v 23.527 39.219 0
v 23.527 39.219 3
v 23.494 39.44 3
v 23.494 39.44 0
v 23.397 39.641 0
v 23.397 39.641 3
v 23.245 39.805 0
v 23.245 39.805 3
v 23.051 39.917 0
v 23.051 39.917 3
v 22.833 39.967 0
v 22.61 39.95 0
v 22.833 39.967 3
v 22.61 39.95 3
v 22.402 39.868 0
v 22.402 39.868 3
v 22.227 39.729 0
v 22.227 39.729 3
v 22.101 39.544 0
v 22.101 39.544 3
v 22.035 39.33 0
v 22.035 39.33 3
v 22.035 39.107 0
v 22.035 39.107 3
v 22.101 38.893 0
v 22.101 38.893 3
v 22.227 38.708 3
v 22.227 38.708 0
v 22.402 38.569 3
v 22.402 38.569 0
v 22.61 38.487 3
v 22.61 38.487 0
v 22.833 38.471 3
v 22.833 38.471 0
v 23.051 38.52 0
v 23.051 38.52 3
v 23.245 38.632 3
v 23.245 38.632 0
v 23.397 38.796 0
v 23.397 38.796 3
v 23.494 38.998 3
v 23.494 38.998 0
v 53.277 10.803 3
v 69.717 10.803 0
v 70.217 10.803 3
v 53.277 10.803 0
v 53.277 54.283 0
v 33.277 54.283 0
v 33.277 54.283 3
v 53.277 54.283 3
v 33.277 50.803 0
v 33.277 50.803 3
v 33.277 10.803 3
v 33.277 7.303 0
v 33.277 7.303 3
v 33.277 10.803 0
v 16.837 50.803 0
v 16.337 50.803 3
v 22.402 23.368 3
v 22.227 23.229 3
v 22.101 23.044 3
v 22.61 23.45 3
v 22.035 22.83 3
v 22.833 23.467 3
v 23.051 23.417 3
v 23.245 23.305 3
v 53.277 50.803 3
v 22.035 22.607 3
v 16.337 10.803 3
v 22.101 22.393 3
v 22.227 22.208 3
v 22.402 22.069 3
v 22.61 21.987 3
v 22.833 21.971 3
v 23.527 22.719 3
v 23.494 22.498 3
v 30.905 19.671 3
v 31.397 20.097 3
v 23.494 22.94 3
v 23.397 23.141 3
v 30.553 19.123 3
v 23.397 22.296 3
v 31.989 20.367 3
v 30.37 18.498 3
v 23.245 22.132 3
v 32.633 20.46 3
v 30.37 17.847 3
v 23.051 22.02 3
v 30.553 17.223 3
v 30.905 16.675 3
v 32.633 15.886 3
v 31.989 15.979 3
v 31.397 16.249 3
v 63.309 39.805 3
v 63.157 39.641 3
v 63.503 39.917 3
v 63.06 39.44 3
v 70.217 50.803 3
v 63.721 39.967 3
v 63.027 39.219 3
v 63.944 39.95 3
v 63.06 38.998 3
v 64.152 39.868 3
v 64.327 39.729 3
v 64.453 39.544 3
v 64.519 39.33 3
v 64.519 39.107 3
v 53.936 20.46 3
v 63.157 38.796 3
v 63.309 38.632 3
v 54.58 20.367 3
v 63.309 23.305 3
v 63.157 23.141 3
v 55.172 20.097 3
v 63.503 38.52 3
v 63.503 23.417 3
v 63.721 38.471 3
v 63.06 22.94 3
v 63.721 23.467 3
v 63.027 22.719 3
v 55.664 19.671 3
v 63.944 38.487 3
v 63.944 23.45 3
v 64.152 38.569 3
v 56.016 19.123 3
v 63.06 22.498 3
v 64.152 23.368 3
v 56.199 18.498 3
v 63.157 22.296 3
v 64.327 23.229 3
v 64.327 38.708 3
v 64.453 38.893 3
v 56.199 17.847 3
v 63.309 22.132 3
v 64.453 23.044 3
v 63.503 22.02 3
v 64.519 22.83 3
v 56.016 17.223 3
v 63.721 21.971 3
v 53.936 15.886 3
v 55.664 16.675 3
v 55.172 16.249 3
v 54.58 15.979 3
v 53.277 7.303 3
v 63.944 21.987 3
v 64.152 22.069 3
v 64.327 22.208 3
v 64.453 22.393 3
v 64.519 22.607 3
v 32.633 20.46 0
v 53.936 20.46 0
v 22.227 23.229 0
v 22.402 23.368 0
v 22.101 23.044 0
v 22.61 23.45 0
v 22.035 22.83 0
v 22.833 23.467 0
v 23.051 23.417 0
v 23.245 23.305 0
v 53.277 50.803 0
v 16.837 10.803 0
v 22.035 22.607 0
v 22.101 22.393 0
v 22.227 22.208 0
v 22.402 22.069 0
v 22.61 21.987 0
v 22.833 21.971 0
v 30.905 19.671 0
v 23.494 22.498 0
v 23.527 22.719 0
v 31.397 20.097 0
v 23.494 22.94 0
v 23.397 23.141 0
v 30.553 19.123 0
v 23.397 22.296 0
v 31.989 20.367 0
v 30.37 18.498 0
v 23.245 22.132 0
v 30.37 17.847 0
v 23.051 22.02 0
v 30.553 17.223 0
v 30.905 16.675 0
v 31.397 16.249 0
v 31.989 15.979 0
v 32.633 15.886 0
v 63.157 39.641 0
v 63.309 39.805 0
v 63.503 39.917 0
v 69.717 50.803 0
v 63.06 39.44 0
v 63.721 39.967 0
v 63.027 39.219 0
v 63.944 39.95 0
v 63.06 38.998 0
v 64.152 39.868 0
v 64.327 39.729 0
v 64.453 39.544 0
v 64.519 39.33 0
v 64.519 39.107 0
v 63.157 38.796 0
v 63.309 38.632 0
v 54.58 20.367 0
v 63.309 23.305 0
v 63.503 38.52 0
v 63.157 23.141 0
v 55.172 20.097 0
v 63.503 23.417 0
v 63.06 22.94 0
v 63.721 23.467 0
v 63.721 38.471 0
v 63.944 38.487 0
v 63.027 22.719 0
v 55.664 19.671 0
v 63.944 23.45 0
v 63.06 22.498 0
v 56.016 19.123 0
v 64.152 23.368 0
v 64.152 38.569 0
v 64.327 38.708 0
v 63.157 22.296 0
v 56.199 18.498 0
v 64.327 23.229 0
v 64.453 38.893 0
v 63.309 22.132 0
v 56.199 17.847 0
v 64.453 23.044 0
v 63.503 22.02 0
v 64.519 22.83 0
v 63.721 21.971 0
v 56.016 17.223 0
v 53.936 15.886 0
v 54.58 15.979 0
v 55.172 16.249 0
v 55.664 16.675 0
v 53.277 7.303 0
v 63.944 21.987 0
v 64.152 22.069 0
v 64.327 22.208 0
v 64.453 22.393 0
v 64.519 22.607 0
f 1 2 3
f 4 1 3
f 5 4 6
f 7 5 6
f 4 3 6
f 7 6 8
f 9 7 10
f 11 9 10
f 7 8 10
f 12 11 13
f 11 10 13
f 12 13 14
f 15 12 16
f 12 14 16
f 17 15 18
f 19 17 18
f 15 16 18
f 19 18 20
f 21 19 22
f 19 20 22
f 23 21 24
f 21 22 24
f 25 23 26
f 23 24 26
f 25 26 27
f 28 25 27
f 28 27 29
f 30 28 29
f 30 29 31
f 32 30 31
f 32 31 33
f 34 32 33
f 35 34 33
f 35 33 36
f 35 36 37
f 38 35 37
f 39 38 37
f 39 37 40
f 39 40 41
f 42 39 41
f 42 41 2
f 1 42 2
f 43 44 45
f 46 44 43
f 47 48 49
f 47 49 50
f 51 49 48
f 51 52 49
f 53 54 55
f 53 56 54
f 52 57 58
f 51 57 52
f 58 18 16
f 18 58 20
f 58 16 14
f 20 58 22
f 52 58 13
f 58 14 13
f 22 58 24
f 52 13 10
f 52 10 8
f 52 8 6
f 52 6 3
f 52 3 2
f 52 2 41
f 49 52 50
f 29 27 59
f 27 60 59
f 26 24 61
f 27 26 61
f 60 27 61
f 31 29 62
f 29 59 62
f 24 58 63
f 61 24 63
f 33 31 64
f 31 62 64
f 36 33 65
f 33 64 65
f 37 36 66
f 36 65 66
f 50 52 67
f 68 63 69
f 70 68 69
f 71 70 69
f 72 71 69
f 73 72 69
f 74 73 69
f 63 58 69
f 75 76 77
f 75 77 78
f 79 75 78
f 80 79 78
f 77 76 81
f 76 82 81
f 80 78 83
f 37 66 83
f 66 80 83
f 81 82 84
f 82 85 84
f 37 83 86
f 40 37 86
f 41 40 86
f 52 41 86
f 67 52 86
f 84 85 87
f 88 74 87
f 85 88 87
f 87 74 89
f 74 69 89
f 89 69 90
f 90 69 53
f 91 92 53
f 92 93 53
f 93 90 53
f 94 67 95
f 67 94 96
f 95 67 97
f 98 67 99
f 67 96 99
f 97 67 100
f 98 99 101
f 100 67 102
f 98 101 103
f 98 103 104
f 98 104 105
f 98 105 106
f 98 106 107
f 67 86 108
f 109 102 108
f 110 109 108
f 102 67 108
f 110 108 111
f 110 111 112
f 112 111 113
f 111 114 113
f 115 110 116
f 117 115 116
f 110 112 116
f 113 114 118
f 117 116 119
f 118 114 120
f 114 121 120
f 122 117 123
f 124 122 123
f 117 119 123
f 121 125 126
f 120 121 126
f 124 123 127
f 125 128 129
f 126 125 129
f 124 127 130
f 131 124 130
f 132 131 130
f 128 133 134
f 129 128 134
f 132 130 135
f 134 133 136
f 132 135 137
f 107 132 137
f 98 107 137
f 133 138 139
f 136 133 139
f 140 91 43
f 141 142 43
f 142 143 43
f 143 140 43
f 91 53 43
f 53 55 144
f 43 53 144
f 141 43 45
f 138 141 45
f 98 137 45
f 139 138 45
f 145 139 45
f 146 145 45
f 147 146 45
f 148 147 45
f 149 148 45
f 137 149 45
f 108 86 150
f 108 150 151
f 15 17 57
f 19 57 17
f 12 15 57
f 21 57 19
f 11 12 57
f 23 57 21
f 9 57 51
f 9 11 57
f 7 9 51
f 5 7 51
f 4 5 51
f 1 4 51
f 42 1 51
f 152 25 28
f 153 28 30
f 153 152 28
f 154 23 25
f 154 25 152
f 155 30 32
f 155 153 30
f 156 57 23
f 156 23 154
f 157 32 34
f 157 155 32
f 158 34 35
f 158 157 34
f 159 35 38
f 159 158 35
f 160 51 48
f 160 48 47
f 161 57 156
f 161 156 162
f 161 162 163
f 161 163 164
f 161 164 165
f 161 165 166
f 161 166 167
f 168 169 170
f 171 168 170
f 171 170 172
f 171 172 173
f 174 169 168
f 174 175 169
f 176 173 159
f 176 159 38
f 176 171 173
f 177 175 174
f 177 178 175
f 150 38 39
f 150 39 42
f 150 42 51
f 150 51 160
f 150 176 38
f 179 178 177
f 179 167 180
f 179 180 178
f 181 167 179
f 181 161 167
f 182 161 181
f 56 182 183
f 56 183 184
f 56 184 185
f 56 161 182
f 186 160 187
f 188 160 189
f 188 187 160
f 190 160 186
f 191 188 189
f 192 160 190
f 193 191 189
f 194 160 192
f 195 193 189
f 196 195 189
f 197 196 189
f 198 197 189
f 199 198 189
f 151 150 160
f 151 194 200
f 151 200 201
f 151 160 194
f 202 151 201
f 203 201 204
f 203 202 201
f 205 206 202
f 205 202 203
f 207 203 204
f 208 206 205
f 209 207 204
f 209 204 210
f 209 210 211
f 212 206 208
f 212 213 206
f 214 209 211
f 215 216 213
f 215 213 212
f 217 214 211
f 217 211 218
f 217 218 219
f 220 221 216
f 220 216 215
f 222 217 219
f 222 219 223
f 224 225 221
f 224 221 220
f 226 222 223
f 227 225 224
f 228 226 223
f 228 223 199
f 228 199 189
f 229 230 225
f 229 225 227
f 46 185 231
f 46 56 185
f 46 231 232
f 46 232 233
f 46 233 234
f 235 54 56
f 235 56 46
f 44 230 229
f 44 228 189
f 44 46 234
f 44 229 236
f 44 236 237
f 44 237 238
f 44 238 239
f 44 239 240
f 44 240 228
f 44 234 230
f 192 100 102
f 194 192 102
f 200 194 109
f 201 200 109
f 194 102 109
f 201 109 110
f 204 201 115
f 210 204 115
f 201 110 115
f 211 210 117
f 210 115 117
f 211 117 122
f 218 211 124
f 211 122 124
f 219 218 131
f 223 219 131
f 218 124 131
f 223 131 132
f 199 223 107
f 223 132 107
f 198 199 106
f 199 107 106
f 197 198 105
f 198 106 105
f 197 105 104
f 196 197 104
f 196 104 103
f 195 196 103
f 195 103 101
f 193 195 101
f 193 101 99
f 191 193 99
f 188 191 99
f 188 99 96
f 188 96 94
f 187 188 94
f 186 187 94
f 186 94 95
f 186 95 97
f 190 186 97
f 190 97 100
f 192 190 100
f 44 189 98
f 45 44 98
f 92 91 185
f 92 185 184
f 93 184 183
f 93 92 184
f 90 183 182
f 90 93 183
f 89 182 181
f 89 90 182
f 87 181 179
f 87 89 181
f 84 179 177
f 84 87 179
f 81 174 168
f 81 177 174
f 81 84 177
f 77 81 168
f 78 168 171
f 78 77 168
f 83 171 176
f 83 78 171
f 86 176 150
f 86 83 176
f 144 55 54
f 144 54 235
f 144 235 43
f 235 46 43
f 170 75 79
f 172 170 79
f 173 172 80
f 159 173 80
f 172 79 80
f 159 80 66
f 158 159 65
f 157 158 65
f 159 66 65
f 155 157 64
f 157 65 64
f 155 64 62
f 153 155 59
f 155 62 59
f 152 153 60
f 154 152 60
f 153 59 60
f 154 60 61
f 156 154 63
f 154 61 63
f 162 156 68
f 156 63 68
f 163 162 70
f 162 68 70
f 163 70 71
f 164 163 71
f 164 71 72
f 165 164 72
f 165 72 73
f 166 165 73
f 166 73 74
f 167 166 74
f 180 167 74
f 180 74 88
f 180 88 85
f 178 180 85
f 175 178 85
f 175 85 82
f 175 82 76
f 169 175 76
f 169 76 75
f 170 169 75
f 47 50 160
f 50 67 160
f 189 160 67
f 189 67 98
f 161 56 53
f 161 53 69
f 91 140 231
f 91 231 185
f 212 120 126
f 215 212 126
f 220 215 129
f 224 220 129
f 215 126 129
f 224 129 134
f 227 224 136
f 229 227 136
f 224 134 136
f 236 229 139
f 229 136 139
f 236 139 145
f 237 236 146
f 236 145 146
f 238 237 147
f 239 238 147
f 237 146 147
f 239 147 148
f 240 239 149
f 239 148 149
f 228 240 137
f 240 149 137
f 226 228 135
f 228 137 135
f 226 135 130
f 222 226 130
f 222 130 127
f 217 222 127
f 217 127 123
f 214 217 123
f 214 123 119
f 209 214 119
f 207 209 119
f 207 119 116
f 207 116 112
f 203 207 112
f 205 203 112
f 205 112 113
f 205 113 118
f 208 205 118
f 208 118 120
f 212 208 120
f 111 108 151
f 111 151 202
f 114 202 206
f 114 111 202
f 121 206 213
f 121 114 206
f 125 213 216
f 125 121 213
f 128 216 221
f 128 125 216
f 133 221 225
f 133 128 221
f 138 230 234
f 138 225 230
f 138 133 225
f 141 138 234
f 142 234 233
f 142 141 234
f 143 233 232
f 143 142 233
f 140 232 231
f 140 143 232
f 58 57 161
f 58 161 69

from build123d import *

# Parameters (mm, degrees)
BOSS_EXTRUDE1_DEPTH = 3
SKETCH1_W           = 20
SKETCH1_H           = 3
BOSS_EXTRUDE2_DEPTH = 2
SKETCH2_W           = 20
SKETCH2_H           = 3
BOSS_EXTRUDE3_DEPTH = 2
CUT_EXTRUDE4_DEPTH  = 44
SKETCH4_R           = 0.75
CUT_EXTRUDE5_DEPTH  = 16
CUT_EXTRUDE6_DEPTH  = 16


with BuildPart() as part:
    # Model → Boss-Extrude1 (new body)
    with BuildSketch(Plane.XY):
        Polygon((70.216761418, 10.802709547), (53.276888396, 10.802709547), (53.276888396, 9.302709547), (33.276888396, 9.302709547), (33.276888396, 10.802709547), (16.337015373, 10.802709547), (16.337015373, 50.802709547), (33.276888396, 50.802709547), (33.276888396, 52.283127555), (53.276888396, 52.283127555), (53.276888396, 50.802709547), (70.216761418, 50.802709547), align=None)
    extrude(amount=BOSS_EXTRUDE1_DEPTH)

    # Sketch1 → Boss-Extrude2 (add)
    with BuildSketch(Plane.XZ.offset(-9.302709547)):
        with Locations((43.276888396, 1.5)):
            Rectangle(SKETCH1_W, SKETCH1_H)
    extrude(amount=BOSS_EXTRUDE2_DEPTH)

    # Sketch2 → Boss-Extrude3 (add)
    with BuildSketch(Plane(origin=(0, 52.283127555, 0), x_dir=(1, 0, 0), z_dir=(0, 1, 0))):
        with Locations((43.276888396, -1.5)):
            Rectangle(SKETCH2_W, SKETCH2_H)
    extrude(amount=BOSS_EXTRUDE3_DEPTH)

    # Sketch3 → Cut-Extrude4 (cut)
    with BuildSketch(Plane(origin=(0, 50.802709547, 0), x_dir=(1, 0, 0), z_dir=(0, 1, 0))):
        Polygon((70.216761418, 0), (69.716761418, 0), (70.216761418, -3), align=None)
        Polygon((16.337015373, -3), (16.337015373, 0), (16.837015373, 0), align=None)
    extrude(amount=-CUT_EXTRUDE4_DEPTH, mode=Mode.SUBTRACT)

    # Sketch4 → Cut-Extrude5 (cut)
    with BuildSketch(Plane.XY.offset(3)):
        with Locations((22.776888396, 39.218622605)):
            Circle(SKETCH4_R)
        with Locations((22.776888396, 22.718622605)):
            Circle(SKETCH4_R)
        with Locations(Location((63.776888396, 22.718622605, 0), (0, 0, 180))):
            Circle(SKETCH4_R)
        with Locations(Location((63.776888396, 39.218622605, 0), (0, 0, 180))):
            Circle(SKETCH4_R)
    extrude(amount=-CUT_EXTRUDE5_DEPTH, mode=Mode.SUBTRACT)

    # Sketch5 → Cut-Extrude6 (cut)
    with BuildSketch(Plane.XY.offset(3)):
        with BuildLine():
            Line((32.633411635, 20.459880451), (53.935807441, 20.459880451))
            ThreePointArc((53.935807441, 20.459880451), (56.222748266, 18.172939626), (53.935807441, 15.885998802))
            Line((53.935807441, 15.885998802), (32.633411635, 15.885998802))
            ThreePointArc((32.633411635, 15.885998802), (30.34647081, 18.172939626), (32.633411635, 20.459880451))
        make_face()
    extrude(amount=-CUT_EXTRUDE6_DEPTH, mode=Mode.SUBTRACT)


solid = part.part
